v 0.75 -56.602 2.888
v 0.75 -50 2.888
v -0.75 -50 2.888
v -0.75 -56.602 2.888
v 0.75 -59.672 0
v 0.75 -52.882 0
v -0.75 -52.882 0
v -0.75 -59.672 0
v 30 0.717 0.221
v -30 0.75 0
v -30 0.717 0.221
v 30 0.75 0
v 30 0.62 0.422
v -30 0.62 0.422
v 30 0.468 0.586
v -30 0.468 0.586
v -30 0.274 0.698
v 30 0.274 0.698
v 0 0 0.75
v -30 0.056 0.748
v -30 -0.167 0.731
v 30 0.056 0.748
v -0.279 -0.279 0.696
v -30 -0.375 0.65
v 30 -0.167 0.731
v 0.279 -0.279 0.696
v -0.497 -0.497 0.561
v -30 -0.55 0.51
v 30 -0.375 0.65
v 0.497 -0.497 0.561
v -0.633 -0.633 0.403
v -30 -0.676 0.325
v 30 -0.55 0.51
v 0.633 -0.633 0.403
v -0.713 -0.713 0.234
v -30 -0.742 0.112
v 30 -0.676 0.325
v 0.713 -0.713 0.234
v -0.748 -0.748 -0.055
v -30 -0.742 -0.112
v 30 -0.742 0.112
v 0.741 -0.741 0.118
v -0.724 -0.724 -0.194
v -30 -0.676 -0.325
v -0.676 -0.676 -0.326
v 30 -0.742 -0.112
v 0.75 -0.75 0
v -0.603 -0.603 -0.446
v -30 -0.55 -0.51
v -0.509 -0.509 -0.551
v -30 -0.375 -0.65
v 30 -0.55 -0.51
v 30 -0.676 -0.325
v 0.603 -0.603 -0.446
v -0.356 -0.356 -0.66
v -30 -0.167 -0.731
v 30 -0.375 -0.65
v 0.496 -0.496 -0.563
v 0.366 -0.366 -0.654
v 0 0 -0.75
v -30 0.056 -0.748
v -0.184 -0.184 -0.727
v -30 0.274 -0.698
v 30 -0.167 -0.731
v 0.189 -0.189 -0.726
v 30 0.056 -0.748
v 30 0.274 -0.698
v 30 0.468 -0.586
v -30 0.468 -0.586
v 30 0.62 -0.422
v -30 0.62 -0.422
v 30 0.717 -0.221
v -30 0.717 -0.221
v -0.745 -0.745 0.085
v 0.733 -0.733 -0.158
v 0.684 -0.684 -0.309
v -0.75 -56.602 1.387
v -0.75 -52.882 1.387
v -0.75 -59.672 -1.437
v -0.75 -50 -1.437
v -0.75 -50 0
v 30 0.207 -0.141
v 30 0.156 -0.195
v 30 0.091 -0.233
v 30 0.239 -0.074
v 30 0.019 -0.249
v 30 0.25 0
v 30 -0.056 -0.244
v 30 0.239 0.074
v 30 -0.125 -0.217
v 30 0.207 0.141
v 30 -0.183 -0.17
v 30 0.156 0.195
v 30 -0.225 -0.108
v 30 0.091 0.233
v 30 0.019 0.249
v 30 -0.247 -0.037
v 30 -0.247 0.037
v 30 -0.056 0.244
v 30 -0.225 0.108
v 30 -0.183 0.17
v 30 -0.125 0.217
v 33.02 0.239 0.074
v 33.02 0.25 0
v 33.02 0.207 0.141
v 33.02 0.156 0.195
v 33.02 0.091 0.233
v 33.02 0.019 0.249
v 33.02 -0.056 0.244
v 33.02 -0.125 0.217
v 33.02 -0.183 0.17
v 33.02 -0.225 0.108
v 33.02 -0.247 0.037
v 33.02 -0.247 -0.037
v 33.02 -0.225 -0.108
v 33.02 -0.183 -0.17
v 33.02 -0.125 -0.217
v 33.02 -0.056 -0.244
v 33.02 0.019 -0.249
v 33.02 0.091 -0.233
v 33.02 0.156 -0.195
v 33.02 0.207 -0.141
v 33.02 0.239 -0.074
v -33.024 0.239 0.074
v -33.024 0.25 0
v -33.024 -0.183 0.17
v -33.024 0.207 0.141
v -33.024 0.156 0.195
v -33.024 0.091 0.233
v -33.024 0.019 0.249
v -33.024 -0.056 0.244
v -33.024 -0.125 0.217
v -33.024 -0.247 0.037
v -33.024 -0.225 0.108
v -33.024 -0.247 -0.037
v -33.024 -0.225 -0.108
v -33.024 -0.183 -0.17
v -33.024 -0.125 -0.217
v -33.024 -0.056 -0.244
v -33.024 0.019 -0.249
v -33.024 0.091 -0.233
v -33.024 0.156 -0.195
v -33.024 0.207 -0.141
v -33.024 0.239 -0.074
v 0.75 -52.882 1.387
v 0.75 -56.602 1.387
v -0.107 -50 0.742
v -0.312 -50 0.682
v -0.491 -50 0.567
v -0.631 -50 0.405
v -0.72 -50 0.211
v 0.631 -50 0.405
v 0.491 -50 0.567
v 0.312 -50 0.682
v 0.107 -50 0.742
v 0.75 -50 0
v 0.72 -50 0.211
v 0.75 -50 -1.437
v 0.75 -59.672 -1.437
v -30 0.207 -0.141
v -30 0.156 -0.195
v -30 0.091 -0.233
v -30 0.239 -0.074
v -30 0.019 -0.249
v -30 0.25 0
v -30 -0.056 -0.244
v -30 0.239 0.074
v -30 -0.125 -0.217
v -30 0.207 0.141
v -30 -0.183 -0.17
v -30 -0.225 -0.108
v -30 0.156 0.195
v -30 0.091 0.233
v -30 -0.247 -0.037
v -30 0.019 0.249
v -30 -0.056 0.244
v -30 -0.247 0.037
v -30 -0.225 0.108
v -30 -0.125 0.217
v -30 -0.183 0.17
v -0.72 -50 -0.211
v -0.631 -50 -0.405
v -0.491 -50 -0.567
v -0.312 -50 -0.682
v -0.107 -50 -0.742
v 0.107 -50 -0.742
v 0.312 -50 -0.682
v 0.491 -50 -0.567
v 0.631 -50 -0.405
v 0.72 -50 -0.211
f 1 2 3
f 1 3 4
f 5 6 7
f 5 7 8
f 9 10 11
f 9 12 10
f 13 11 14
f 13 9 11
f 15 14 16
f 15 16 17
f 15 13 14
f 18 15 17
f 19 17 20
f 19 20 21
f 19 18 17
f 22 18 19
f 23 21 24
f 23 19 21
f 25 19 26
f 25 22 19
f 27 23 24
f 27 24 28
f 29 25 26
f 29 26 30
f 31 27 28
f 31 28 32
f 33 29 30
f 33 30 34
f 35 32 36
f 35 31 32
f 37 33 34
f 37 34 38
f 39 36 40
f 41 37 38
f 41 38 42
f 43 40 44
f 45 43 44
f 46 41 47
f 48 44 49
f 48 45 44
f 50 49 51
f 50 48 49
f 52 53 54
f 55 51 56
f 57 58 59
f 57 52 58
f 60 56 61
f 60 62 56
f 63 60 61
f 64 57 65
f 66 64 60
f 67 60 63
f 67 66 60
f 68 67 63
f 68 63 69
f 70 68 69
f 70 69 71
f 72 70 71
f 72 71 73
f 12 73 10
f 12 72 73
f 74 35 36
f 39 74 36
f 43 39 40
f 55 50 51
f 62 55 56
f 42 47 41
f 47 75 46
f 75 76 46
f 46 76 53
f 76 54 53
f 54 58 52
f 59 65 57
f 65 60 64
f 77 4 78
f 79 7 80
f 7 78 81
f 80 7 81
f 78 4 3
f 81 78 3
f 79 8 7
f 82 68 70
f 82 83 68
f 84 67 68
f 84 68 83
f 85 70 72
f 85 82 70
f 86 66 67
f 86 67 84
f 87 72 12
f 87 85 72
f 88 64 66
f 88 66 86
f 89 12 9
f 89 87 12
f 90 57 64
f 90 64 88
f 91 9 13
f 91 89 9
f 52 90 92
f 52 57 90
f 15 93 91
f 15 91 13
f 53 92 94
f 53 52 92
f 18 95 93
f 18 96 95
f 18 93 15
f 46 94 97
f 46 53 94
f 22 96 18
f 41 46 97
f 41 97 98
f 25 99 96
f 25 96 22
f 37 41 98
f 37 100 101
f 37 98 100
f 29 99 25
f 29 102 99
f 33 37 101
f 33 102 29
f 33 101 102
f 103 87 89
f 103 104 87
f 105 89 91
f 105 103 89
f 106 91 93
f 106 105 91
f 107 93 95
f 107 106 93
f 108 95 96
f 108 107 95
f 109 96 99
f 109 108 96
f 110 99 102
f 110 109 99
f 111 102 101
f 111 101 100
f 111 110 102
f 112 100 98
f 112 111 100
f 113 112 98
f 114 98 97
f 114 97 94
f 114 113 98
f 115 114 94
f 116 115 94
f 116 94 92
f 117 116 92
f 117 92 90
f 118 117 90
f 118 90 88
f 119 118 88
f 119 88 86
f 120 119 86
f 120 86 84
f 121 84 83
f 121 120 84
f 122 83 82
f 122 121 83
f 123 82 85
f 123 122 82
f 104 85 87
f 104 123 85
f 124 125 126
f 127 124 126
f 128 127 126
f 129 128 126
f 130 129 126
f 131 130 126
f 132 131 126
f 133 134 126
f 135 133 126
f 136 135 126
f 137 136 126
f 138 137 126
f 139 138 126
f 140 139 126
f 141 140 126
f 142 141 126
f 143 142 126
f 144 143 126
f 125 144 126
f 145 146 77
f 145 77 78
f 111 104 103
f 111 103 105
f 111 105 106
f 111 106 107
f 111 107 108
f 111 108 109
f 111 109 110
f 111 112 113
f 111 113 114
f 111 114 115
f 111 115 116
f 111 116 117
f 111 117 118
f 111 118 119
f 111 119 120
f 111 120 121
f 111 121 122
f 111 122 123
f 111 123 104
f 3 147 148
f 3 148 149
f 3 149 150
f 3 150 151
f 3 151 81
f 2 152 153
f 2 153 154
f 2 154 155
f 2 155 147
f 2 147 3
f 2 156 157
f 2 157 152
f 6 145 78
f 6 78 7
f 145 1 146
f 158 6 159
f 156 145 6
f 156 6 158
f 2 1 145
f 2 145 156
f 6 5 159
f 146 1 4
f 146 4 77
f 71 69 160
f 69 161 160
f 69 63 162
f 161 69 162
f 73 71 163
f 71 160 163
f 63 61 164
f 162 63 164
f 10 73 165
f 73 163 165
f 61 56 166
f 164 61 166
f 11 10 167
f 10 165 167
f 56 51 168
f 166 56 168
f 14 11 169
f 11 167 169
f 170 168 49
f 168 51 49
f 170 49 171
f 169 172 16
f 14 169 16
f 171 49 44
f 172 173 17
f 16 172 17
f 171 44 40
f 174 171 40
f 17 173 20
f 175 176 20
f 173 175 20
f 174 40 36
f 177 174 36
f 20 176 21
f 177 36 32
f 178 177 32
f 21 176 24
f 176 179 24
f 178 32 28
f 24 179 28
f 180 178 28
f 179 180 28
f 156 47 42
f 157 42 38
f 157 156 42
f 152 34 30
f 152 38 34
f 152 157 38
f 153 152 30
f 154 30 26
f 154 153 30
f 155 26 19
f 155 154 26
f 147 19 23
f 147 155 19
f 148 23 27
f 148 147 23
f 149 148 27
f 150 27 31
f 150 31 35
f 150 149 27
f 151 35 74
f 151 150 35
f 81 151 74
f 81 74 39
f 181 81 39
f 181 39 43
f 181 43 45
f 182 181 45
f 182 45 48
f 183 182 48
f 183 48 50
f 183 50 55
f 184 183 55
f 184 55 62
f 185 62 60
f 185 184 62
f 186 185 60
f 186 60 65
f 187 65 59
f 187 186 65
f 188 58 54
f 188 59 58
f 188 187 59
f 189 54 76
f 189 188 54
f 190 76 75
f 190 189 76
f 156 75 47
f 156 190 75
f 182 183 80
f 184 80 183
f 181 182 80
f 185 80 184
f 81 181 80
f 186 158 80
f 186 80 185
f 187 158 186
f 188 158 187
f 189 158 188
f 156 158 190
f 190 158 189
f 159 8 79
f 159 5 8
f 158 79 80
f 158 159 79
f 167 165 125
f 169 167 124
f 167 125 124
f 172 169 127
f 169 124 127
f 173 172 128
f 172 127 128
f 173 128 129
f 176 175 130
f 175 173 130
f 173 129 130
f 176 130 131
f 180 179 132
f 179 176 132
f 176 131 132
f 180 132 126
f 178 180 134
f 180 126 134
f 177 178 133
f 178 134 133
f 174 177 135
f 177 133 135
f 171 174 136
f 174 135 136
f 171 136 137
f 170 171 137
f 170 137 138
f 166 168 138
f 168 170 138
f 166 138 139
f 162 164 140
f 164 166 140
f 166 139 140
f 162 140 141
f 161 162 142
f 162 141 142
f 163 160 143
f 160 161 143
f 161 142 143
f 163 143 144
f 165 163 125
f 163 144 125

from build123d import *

# Parameters (mm, degrees)
F2_R      = 0.75
F10_R     = 0.25
F15_R     = 0.75
F19_DEPTH = 0.75


# Not quite as in the source:
# - a feature of the source that left no trace in its solid (it failed there, or was rolled back) is left out
# - a pattern or mirror of a feature is missing from the dataset's text; its kind, count and spacing are read off the source's solid


with BuildPart() as f3:
    # F3: sweep along a path in F0
    with BuildLine(Plane.XZ) as f3_path:
        Line((-30, 0), (0, 0))
        Line((0, 0), (30, 0))
    # F2 (on plane+point) → F3 (sweep)
    with BuildSketch(Plane.YZ.offset(-30)):
        Circle(F2_R)
    sweep(path=f3_path.line)

    # F11: sweep along a path in F8
    with BuildLine(Plane.XZ) as f11_path:
        Line((0, 0), (33.02, 0))
    # F10 (on plane+point) → F11 (sweep)
    with BuildSketch(Plane.YZ.offset(33.02)):
        Circle(F10_R)
    f11 = sweep(path=f11_path.line)

    # F11_copies: F11 across plane
    add(f11.mirror(Plane(origin=(-0.001764, 0, 0), x_dir=(0, 0, -1), z_dir=(-1, 0, 0))))

    # F16: sweep along a path in F13
    with BuildLine(Plane.YZ) as f16_path:
        Line((0, 0), (-50, 0))
    # F15 (on plane+point) → F16 (sweep)
    with BuildSketch(Plane.XZ.offset(50)):
        Circle(F15_R)
    sweep(path=f16_path.line)

    # F18 (on plane+point) → F19 (join, symmetric)
    with BuildSketch(Plane.YZ):
        Polygon((-50, -1.4374784192), (-50, 0), (-50, 2.8882389888), (-56.6018782556, 2.8882389888), (-56.6018782556, 1.3868947281), (-52.8817437589, 1.3868947281), (-52.8817437589, 0), (-59.6723221242, 0), (-59.6723221242, -1.4374784192), align=None)
    extrude(amount=F19_DEPTH, both=True)


solid = f3.part
